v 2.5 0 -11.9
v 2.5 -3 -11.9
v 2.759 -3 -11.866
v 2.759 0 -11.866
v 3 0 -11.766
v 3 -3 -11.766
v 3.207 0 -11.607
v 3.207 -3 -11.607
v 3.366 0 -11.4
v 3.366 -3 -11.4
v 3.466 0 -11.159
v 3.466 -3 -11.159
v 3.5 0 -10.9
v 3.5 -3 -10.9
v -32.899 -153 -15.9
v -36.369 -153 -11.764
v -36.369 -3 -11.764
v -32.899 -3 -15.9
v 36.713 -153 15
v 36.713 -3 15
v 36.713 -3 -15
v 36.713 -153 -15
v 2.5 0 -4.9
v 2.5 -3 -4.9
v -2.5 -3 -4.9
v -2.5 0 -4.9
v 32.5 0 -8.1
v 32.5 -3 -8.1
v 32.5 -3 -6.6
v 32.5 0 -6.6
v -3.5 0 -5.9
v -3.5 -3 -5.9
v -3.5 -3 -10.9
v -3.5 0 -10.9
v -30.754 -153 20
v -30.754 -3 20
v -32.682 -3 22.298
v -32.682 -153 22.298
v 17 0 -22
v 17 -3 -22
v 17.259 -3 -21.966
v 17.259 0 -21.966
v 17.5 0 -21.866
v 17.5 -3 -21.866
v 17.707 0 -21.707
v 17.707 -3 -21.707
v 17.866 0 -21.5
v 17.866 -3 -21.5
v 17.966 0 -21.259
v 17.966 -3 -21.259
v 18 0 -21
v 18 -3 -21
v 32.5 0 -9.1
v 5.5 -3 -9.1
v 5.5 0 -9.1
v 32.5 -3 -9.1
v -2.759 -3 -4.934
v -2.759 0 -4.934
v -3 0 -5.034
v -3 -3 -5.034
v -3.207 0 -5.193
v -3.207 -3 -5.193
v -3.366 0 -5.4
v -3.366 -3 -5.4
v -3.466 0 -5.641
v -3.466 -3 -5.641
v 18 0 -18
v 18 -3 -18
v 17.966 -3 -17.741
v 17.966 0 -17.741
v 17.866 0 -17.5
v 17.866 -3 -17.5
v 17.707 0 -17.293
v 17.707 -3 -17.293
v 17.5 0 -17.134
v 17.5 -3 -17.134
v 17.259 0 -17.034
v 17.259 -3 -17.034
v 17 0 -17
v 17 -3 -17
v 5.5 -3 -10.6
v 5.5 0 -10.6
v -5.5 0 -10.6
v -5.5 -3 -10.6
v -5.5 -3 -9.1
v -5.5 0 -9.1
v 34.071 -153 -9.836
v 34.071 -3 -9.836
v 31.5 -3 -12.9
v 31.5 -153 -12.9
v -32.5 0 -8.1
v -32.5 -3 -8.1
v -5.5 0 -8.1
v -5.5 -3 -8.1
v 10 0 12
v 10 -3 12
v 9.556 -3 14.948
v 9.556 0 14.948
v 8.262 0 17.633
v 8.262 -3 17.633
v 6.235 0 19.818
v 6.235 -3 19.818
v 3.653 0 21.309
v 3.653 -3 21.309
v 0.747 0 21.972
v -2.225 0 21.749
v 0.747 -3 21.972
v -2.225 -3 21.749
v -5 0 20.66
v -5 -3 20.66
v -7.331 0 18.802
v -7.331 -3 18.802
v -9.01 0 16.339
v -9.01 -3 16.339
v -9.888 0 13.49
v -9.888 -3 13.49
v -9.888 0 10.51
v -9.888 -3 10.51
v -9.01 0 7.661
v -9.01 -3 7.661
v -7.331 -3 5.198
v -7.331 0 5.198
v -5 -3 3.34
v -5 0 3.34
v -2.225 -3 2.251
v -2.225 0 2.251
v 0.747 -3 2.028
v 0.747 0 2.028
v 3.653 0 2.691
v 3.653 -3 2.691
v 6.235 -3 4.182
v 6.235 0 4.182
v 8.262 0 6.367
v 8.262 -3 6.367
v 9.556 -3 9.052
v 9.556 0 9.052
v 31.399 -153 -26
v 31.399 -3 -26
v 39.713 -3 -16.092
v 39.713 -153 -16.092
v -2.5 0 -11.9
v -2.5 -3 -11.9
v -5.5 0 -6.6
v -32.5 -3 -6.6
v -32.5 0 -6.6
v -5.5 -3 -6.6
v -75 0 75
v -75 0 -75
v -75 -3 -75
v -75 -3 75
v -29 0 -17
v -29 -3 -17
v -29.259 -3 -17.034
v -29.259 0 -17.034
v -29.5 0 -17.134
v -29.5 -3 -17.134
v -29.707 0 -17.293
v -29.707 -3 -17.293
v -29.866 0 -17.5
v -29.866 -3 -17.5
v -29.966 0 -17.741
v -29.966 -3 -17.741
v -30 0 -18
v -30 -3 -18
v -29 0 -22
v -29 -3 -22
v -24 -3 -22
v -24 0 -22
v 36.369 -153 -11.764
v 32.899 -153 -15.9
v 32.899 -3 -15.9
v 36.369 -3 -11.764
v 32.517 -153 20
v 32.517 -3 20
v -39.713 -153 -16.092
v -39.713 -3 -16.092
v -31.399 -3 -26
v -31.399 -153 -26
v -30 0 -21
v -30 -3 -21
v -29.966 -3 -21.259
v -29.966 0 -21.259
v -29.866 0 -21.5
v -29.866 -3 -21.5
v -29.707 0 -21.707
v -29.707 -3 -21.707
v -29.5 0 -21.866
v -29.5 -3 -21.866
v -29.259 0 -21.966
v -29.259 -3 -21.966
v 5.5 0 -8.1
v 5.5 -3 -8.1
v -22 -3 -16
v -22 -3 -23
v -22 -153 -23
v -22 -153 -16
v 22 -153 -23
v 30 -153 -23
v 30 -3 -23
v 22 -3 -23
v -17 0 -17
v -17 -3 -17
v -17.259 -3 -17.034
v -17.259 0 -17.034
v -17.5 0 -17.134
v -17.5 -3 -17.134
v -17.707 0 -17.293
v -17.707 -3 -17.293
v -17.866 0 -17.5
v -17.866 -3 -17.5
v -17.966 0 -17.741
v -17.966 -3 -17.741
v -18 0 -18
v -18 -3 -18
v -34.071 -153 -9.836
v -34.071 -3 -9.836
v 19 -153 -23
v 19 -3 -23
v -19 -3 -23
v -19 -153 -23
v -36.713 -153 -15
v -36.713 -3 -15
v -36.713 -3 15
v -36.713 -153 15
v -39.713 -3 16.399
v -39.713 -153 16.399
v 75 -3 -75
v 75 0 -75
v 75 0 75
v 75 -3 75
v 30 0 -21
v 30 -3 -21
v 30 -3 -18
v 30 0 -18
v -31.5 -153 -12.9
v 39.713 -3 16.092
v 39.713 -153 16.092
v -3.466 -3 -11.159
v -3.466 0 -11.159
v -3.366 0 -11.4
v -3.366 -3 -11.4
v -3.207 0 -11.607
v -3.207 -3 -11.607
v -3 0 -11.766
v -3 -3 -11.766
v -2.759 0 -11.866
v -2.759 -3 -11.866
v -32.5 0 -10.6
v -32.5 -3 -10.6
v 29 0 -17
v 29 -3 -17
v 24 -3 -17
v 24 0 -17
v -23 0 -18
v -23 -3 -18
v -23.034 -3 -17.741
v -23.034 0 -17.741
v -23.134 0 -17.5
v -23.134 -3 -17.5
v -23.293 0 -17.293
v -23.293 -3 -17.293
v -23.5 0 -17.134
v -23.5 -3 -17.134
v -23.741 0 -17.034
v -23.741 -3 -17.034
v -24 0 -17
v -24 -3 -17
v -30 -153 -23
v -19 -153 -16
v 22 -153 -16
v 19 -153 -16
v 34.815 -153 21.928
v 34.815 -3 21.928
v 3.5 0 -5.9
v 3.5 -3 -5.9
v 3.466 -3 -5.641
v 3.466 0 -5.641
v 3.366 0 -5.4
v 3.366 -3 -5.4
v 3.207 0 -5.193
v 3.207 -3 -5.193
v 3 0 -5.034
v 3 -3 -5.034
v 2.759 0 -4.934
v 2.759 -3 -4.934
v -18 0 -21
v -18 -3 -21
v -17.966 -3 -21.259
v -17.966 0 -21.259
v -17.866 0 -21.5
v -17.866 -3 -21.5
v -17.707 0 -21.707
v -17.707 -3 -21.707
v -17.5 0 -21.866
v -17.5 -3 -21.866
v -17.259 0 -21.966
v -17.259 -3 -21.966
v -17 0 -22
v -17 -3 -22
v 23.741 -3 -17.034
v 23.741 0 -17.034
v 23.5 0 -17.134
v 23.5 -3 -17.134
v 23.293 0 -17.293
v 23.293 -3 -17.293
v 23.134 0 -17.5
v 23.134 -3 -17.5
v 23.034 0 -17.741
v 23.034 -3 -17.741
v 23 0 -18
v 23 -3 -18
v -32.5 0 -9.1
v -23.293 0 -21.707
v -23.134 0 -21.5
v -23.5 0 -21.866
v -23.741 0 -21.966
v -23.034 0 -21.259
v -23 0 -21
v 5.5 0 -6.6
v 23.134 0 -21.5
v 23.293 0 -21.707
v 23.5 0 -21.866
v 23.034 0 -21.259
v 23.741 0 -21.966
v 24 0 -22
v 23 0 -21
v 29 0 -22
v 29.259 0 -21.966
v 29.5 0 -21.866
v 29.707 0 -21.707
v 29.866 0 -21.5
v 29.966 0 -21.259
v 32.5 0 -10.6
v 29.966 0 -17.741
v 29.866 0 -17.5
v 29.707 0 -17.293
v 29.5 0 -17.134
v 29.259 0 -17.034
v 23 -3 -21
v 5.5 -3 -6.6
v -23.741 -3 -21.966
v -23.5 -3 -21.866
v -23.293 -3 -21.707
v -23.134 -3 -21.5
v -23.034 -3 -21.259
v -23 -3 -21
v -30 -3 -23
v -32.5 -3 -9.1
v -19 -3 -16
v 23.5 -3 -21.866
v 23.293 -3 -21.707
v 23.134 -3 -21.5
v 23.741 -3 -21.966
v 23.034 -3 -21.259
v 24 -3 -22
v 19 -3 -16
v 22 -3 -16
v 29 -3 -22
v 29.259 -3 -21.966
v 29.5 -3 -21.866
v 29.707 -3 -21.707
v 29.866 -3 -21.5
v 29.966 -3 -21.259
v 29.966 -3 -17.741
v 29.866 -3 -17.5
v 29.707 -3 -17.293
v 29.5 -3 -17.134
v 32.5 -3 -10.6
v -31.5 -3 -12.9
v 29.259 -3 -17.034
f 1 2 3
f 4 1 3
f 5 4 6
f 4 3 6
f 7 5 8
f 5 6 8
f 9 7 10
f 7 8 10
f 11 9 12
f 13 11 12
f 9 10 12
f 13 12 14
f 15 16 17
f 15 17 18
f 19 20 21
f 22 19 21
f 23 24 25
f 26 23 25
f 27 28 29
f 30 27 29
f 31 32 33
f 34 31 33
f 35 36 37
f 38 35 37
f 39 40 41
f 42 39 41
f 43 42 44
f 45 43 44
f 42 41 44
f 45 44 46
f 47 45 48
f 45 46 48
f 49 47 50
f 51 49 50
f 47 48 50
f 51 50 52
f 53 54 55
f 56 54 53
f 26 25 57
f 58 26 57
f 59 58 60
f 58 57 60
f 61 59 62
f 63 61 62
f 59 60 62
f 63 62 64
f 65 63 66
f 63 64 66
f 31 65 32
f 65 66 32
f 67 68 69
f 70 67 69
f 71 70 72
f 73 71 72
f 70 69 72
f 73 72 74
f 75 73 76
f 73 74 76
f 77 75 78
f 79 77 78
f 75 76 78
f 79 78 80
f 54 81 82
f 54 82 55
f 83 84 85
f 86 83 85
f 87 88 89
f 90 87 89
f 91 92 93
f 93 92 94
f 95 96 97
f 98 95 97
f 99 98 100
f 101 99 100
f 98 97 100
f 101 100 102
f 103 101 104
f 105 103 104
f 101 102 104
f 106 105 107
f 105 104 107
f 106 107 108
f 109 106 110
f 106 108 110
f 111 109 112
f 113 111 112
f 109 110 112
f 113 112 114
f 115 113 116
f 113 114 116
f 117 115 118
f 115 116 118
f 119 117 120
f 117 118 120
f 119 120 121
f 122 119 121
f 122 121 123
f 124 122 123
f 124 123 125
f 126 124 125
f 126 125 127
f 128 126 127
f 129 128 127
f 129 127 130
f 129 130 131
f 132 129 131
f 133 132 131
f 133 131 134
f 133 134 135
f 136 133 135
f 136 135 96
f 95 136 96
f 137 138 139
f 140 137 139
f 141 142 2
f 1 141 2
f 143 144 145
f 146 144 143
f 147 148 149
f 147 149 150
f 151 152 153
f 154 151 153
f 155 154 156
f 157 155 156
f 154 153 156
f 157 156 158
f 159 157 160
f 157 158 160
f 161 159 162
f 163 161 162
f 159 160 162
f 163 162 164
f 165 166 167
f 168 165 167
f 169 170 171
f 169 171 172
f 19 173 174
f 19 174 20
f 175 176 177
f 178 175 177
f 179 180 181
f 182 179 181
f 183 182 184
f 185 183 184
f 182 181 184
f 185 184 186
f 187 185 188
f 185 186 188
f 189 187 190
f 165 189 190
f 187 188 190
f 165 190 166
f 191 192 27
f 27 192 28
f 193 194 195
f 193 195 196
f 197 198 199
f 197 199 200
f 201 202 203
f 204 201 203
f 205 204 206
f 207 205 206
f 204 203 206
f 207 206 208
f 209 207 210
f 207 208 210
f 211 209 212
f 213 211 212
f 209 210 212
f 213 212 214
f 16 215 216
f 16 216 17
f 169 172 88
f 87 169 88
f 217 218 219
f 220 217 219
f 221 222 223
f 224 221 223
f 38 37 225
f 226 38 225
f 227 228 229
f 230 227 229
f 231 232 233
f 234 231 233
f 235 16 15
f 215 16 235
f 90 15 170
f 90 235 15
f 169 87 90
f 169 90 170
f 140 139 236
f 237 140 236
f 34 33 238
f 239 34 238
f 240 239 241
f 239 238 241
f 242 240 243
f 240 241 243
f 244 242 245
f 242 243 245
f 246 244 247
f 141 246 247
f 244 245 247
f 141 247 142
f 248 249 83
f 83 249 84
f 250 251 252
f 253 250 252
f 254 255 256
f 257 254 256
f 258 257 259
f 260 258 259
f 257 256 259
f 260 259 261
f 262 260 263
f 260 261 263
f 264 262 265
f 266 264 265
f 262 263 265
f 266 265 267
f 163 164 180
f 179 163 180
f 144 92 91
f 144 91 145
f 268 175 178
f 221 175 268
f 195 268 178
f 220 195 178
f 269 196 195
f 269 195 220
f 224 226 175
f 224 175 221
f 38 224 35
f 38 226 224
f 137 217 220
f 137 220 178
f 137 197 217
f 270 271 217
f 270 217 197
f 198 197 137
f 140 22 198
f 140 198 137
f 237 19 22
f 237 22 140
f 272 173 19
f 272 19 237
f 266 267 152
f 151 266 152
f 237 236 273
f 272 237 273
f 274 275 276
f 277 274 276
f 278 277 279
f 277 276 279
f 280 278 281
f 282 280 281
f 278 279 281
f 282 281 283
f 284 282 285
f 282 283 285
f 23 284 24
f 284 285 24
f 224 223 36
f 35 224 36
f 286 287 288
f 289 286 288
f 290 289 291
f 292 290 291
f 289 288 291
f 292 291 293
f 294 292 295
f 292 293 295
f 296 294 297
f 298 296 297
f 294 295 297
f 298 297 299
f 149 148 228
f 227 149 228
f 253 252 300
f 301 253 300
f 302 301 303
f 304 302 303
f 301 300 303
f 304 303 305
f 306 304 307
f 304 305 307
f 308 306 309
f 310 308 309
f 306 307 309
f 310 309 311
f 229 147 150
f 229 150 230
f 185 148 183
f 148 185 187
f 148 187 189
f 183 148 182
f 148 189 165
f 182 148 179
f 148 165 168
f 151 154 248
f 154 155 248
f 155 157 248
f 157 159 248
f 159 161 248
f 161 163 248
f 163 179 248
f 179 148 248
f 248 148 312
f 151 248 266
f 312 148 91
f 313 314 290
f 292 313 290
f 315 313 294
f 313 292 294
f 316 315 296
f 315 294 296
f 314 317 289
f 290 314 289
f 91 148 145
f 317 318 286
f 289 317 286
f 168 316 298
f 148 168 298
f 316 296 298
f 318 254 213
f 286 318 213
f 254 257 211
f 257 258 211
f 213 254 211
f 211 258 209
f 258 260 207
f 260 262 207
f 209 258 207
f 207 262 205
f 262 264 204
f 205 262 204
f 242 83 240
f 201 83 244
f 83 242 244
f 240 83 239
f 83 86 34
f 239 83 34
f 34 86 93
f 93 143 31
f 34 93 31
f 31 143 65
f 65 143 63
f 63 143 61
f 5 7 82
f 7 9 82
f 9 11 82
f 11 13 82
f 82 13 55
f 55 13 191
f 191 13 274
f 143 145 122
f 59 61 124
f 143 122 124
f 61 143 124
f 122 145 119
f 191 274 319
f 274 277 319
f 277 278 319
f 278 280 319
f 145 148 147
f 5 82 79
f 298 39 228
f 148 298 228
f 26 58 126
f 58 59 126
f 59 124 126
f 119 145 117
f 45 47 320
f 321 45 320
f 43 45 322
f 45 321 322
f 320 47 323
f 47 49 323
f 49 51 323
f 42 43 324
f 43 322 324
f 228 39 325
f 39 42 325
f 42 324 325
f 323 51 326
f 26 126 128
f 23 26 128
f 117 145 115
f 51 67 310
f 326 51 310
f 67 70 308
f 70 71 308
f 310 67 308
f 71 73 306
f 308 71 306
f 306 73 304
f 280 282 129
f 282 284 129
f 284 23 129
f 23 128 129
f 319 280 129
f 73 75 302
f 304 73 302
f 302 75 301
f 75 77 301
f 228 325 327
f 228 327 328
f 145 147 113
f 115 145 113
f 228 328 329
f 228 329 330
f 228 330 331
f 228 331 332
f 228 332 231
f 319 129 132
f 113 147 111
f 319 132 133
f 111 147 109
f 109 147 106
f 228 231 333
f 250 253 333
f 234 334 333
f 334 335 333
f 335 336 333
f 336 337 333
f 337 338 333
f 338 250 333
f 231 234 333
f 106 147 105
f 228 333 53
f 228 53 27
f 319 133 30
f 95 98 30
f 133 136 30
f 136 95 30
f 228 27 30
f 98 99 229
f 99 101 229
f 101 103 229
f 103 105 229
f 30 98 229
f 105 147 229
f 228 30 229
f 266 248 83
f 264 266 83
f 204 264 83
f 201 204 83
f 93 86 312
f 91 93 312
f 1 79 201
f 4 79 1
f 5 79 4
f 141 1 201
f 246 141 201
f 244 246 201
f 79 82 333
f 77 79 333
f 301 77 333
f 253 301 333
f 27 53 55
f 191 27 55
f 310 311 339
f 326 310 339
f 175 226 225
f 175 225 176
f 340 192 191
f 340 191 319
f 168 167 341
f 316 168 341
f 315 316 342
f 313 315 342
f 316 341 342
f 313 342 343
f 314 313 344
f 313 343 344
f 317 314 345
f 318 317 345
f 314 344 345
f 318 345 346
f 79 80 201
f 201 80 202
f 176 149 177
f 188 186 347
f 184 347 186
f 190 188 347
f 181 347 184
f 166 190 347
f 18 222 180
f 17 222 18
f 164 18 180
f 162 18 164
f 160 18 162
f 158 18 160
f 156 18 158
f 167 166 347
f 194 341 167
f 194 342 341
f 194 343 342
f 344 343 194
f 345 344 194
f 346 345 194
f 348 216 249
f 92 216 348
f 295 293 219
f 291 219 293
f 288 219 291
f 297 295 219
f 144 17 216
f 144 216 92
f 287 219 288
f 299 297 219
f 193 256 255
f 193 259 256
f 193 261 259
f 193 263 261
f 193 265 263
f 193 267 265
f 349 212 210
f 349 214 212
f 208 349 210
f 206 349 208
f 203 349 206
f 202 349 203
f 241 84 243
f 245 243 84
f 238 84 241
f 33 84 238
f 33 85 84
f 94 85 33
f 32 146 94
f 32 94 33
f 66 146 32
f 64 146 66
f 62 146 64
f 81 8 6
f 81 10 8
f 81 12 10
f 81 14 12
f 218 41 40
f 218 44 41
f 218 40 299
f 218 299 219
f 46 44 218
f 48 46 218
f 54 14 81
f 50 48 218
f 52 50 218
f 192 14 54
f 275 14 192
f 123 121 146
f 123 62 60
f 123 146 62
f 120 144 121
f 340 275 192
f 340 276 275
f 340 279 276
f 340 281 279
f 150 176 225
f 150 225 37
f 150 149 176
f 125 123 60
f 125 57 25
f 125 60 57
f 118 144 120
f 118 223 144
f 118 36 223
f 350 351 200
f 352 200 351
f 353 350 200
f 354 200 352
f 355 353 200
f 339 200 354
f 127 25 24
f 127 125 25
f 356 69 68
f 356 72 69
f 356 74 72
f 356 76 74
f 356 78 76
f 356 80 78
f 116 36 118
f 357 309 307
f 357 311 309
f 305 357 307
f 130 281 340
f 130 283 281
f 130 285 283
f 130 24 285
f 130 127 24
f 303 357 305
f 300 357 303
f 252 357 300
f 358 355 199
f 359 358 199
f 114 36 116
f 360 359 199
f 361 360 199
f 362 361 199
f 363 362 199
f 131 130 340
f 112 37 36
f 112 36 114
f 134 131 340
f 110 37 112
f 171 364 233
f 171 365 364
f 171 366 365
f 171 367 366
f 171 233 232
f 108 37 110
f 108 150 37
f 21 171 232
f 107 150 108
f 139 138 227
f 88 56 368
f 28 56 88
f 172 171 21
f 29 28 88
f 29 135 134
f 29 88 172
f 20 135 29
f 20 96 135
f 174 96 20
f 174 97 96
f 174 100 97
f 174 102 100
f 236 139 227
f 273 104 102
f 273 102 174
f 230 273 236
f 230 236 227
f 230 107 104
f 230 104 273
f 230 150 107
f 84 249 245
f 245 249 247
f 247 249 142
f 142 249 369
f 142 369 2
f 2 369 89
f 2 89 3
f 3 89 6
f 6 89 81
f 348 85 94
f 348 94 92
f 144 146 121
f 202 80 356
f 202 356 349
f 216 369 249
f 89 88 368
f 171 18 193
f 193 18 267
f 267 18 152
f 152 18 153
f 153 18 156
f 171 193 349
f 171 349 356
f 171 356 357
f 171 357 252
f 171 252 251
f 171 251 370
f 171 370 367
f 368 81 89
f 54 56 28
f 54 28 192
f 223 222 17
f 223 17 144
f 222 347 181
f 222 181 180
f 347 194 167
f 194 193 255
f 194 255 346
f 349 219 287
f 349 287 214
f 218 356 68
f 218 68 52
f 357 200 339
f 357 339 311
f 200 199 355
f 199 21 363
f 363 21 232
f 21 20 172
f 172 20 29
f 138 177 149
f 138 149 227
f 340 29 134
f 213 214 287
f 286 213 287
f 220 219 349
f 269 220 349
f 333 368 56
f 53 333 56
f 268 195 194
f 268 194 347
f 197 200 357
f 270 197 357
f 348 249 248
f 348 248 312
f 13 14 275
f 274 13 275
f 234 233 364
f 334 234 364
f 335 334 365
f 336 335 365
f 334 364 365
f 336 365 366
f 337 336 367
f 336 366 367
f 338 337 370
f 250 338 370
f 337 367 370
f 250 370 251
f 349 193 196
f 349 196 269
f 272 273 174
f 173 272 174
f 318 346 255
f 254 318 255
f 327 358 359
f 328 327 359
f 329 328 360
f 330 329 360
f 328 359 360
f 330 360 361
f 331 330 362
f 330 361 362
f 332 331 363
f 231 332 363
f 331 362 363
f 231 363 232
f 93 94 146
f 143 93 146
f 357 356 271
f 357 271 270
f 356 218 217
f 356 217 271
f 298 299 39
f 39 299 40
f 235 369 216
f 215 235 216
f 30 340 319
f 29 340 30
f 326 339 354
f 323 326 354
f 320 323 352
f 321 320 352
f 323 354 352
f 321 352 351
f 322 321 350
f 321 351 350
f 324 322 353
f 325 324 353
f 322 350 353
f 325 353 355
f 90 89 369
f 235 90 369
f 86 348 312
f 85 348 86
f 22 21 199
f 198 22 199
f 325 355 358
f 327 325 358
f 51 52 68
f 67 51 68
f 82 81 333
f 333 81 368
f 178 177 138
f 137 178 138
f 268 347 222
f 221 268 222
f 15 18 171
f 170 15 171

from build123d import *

# Parameters (mm, degrees)
F0_W     = 150
F0_H     = 150
F1_DEPTH = 3
F2_W     = 3
F2_H     = 7
F3_DEPTH = 150
F2_R     = 10
F2_W_2   = 27
F2_H_2   = 1.5
F4_DEPTH = 3.001


with BuildPart() as f1:
    # F0 (on Front) → F1 (new body)
    with BuildSketch(Plane.XZ):
        Rectangle(F0_W, F0_H)
    extrude(amount=F1_DEPTH)

    # F2 (on face) → F3 (join)
    with BuildSketch(Plane.XZ.offset(3)):
        Polygon((-36.712797, 15), (-30.754029, 20), (-32.682392, 22.298133), (-39.712797, 16.398923), (-39.712797, -16.091911), (-31.398923, -26), (31.398923, -26), (39.712797, -16.091911), (39.712797, 16.091911), (34.815432, 21.928363), (32.517299, 20), (36.712797, 15), (36.712797, -15), (30, -23), (22, -23), (19, -23), (-19, -23), (-22, -23), (-30, -23), (-36.712797, -15), align=None)
        with Locations((-20.5, -19.5)):
            Rectangle(F2_W, F2_H)
        Polygon((-31.5, -12.9), (-34.07115, -9.835822), (-36.369284, -11.764185), (-32.898923, -15.9), (32.898923, -15.9), (36.369284, -11.764185), (34.07115, -9.835822), (31.5, -12.9), align=None)
        with Locations((20.5, -19.5)):
            Rectangle(F2_W, F2_H)
    extrude(amount=F3_DEPTH)

    # F2 (on face) → F4 (cut, through all)
    with BuildSketch(Plane.XZ.offset(3)):
        with Locations((0, 12)):
            Circle(F2_R)
        with BuildLine():
            ThreePointArc((-29, -17), (-29.707107, -17.292893), (-30, -18))
            Line((-30, -18), (-30, -21))
            ThreePointArc((-30, -21), (-29.707107, -21.707107), (-29, -22))
            Line((-29, -22), (-24, -22))
            ThreePointArc((-24, -22), (-23.292893, -21.707107), (-23, -21))
            Line((-23, -21), (-23, -18))
            ThreePointArc((-23, -18), (-23.292893, -17.292893), (-24, -17))
            Line((-24, -17), (-29, -17))
        make_face()
        with BuildLine():
            Line((17, -17), (-17, -17))
            ThreePointArc((-17, -17), (-17.707107, -17.292893), (-18, -18))
            Line((-18, -18), (-18, -21))
            ThreePointArc((-18, -21), (-17.707107, -21.707107), (-17, -22))
            Line((-17, -22), (17, -22))
            ThreePointArc((17, -22), (17.707107, -21.707107), (18, -21))
            Line((18, -21), (18, -18))
            ThreePointArc((18, -18), (17.707107, -17.292893), (17, -17))
        make_face()
        with BuildLine():
            Line((29, -17), (24, -17))
            ThreePointArc((24, -17), (23.292893, -17.292893), (23, -18))
            Line((23, -18), (23, -21))
            ThreePointArc((23, -21), (23.292893, -21.707107), (24, -22))
            Line((24, -22), (29, -22))
            ThreePointArc((29, -22), (29.707107, -21.707107), (30, -21))
            Line((30, -21), (30, -18))
            ThreePointArc((30, -18), (29.707107, -17.292893), (29, -17))
        make_face()
        with BuildLine():
            Line((2.5, -4.9), (-2.5, -4.9))
            ThreePointArc((-2.5, -4.9), (-3.207107, -5.192893), (-3.5, -5.9))
            Line((-3.5, -5.9), (-3.5, -10.9))
            ThreePointArc((-3.5, -10.9), (-3.207107, -11.607107), (-2.5, -11.9))
            Line((-2.5, -11.9), (2.5, -11.9))
            ThreePointArc((2.5, -11.9), (3.207107, -11.607107), (3.5, -10.9))
            Line((3.5, -10.9), (3.5, -5.9))
            ThreePointArc((3.5, -5.9), (3.207107, -5.192893), (2.5, -4.9))
        make_face()
        with Locations((-19, -7.35)):
            Rectangle(F2_W_2, F2_H_2)
        with Locations((-19, -9.85)):
            Rectangle(F2_W_2, F2_H_2)
        with Locations((19, -7.35)):
            Rectangle(F2_W_2, F2_H_2)
        with Locations((19, -9.85)):
            Rectangle(F2_W_2, F2_H_2)
    extrude(amount=-F4_DEPTH, mode=Mode.SUBTRACT)


solid = f1.part
